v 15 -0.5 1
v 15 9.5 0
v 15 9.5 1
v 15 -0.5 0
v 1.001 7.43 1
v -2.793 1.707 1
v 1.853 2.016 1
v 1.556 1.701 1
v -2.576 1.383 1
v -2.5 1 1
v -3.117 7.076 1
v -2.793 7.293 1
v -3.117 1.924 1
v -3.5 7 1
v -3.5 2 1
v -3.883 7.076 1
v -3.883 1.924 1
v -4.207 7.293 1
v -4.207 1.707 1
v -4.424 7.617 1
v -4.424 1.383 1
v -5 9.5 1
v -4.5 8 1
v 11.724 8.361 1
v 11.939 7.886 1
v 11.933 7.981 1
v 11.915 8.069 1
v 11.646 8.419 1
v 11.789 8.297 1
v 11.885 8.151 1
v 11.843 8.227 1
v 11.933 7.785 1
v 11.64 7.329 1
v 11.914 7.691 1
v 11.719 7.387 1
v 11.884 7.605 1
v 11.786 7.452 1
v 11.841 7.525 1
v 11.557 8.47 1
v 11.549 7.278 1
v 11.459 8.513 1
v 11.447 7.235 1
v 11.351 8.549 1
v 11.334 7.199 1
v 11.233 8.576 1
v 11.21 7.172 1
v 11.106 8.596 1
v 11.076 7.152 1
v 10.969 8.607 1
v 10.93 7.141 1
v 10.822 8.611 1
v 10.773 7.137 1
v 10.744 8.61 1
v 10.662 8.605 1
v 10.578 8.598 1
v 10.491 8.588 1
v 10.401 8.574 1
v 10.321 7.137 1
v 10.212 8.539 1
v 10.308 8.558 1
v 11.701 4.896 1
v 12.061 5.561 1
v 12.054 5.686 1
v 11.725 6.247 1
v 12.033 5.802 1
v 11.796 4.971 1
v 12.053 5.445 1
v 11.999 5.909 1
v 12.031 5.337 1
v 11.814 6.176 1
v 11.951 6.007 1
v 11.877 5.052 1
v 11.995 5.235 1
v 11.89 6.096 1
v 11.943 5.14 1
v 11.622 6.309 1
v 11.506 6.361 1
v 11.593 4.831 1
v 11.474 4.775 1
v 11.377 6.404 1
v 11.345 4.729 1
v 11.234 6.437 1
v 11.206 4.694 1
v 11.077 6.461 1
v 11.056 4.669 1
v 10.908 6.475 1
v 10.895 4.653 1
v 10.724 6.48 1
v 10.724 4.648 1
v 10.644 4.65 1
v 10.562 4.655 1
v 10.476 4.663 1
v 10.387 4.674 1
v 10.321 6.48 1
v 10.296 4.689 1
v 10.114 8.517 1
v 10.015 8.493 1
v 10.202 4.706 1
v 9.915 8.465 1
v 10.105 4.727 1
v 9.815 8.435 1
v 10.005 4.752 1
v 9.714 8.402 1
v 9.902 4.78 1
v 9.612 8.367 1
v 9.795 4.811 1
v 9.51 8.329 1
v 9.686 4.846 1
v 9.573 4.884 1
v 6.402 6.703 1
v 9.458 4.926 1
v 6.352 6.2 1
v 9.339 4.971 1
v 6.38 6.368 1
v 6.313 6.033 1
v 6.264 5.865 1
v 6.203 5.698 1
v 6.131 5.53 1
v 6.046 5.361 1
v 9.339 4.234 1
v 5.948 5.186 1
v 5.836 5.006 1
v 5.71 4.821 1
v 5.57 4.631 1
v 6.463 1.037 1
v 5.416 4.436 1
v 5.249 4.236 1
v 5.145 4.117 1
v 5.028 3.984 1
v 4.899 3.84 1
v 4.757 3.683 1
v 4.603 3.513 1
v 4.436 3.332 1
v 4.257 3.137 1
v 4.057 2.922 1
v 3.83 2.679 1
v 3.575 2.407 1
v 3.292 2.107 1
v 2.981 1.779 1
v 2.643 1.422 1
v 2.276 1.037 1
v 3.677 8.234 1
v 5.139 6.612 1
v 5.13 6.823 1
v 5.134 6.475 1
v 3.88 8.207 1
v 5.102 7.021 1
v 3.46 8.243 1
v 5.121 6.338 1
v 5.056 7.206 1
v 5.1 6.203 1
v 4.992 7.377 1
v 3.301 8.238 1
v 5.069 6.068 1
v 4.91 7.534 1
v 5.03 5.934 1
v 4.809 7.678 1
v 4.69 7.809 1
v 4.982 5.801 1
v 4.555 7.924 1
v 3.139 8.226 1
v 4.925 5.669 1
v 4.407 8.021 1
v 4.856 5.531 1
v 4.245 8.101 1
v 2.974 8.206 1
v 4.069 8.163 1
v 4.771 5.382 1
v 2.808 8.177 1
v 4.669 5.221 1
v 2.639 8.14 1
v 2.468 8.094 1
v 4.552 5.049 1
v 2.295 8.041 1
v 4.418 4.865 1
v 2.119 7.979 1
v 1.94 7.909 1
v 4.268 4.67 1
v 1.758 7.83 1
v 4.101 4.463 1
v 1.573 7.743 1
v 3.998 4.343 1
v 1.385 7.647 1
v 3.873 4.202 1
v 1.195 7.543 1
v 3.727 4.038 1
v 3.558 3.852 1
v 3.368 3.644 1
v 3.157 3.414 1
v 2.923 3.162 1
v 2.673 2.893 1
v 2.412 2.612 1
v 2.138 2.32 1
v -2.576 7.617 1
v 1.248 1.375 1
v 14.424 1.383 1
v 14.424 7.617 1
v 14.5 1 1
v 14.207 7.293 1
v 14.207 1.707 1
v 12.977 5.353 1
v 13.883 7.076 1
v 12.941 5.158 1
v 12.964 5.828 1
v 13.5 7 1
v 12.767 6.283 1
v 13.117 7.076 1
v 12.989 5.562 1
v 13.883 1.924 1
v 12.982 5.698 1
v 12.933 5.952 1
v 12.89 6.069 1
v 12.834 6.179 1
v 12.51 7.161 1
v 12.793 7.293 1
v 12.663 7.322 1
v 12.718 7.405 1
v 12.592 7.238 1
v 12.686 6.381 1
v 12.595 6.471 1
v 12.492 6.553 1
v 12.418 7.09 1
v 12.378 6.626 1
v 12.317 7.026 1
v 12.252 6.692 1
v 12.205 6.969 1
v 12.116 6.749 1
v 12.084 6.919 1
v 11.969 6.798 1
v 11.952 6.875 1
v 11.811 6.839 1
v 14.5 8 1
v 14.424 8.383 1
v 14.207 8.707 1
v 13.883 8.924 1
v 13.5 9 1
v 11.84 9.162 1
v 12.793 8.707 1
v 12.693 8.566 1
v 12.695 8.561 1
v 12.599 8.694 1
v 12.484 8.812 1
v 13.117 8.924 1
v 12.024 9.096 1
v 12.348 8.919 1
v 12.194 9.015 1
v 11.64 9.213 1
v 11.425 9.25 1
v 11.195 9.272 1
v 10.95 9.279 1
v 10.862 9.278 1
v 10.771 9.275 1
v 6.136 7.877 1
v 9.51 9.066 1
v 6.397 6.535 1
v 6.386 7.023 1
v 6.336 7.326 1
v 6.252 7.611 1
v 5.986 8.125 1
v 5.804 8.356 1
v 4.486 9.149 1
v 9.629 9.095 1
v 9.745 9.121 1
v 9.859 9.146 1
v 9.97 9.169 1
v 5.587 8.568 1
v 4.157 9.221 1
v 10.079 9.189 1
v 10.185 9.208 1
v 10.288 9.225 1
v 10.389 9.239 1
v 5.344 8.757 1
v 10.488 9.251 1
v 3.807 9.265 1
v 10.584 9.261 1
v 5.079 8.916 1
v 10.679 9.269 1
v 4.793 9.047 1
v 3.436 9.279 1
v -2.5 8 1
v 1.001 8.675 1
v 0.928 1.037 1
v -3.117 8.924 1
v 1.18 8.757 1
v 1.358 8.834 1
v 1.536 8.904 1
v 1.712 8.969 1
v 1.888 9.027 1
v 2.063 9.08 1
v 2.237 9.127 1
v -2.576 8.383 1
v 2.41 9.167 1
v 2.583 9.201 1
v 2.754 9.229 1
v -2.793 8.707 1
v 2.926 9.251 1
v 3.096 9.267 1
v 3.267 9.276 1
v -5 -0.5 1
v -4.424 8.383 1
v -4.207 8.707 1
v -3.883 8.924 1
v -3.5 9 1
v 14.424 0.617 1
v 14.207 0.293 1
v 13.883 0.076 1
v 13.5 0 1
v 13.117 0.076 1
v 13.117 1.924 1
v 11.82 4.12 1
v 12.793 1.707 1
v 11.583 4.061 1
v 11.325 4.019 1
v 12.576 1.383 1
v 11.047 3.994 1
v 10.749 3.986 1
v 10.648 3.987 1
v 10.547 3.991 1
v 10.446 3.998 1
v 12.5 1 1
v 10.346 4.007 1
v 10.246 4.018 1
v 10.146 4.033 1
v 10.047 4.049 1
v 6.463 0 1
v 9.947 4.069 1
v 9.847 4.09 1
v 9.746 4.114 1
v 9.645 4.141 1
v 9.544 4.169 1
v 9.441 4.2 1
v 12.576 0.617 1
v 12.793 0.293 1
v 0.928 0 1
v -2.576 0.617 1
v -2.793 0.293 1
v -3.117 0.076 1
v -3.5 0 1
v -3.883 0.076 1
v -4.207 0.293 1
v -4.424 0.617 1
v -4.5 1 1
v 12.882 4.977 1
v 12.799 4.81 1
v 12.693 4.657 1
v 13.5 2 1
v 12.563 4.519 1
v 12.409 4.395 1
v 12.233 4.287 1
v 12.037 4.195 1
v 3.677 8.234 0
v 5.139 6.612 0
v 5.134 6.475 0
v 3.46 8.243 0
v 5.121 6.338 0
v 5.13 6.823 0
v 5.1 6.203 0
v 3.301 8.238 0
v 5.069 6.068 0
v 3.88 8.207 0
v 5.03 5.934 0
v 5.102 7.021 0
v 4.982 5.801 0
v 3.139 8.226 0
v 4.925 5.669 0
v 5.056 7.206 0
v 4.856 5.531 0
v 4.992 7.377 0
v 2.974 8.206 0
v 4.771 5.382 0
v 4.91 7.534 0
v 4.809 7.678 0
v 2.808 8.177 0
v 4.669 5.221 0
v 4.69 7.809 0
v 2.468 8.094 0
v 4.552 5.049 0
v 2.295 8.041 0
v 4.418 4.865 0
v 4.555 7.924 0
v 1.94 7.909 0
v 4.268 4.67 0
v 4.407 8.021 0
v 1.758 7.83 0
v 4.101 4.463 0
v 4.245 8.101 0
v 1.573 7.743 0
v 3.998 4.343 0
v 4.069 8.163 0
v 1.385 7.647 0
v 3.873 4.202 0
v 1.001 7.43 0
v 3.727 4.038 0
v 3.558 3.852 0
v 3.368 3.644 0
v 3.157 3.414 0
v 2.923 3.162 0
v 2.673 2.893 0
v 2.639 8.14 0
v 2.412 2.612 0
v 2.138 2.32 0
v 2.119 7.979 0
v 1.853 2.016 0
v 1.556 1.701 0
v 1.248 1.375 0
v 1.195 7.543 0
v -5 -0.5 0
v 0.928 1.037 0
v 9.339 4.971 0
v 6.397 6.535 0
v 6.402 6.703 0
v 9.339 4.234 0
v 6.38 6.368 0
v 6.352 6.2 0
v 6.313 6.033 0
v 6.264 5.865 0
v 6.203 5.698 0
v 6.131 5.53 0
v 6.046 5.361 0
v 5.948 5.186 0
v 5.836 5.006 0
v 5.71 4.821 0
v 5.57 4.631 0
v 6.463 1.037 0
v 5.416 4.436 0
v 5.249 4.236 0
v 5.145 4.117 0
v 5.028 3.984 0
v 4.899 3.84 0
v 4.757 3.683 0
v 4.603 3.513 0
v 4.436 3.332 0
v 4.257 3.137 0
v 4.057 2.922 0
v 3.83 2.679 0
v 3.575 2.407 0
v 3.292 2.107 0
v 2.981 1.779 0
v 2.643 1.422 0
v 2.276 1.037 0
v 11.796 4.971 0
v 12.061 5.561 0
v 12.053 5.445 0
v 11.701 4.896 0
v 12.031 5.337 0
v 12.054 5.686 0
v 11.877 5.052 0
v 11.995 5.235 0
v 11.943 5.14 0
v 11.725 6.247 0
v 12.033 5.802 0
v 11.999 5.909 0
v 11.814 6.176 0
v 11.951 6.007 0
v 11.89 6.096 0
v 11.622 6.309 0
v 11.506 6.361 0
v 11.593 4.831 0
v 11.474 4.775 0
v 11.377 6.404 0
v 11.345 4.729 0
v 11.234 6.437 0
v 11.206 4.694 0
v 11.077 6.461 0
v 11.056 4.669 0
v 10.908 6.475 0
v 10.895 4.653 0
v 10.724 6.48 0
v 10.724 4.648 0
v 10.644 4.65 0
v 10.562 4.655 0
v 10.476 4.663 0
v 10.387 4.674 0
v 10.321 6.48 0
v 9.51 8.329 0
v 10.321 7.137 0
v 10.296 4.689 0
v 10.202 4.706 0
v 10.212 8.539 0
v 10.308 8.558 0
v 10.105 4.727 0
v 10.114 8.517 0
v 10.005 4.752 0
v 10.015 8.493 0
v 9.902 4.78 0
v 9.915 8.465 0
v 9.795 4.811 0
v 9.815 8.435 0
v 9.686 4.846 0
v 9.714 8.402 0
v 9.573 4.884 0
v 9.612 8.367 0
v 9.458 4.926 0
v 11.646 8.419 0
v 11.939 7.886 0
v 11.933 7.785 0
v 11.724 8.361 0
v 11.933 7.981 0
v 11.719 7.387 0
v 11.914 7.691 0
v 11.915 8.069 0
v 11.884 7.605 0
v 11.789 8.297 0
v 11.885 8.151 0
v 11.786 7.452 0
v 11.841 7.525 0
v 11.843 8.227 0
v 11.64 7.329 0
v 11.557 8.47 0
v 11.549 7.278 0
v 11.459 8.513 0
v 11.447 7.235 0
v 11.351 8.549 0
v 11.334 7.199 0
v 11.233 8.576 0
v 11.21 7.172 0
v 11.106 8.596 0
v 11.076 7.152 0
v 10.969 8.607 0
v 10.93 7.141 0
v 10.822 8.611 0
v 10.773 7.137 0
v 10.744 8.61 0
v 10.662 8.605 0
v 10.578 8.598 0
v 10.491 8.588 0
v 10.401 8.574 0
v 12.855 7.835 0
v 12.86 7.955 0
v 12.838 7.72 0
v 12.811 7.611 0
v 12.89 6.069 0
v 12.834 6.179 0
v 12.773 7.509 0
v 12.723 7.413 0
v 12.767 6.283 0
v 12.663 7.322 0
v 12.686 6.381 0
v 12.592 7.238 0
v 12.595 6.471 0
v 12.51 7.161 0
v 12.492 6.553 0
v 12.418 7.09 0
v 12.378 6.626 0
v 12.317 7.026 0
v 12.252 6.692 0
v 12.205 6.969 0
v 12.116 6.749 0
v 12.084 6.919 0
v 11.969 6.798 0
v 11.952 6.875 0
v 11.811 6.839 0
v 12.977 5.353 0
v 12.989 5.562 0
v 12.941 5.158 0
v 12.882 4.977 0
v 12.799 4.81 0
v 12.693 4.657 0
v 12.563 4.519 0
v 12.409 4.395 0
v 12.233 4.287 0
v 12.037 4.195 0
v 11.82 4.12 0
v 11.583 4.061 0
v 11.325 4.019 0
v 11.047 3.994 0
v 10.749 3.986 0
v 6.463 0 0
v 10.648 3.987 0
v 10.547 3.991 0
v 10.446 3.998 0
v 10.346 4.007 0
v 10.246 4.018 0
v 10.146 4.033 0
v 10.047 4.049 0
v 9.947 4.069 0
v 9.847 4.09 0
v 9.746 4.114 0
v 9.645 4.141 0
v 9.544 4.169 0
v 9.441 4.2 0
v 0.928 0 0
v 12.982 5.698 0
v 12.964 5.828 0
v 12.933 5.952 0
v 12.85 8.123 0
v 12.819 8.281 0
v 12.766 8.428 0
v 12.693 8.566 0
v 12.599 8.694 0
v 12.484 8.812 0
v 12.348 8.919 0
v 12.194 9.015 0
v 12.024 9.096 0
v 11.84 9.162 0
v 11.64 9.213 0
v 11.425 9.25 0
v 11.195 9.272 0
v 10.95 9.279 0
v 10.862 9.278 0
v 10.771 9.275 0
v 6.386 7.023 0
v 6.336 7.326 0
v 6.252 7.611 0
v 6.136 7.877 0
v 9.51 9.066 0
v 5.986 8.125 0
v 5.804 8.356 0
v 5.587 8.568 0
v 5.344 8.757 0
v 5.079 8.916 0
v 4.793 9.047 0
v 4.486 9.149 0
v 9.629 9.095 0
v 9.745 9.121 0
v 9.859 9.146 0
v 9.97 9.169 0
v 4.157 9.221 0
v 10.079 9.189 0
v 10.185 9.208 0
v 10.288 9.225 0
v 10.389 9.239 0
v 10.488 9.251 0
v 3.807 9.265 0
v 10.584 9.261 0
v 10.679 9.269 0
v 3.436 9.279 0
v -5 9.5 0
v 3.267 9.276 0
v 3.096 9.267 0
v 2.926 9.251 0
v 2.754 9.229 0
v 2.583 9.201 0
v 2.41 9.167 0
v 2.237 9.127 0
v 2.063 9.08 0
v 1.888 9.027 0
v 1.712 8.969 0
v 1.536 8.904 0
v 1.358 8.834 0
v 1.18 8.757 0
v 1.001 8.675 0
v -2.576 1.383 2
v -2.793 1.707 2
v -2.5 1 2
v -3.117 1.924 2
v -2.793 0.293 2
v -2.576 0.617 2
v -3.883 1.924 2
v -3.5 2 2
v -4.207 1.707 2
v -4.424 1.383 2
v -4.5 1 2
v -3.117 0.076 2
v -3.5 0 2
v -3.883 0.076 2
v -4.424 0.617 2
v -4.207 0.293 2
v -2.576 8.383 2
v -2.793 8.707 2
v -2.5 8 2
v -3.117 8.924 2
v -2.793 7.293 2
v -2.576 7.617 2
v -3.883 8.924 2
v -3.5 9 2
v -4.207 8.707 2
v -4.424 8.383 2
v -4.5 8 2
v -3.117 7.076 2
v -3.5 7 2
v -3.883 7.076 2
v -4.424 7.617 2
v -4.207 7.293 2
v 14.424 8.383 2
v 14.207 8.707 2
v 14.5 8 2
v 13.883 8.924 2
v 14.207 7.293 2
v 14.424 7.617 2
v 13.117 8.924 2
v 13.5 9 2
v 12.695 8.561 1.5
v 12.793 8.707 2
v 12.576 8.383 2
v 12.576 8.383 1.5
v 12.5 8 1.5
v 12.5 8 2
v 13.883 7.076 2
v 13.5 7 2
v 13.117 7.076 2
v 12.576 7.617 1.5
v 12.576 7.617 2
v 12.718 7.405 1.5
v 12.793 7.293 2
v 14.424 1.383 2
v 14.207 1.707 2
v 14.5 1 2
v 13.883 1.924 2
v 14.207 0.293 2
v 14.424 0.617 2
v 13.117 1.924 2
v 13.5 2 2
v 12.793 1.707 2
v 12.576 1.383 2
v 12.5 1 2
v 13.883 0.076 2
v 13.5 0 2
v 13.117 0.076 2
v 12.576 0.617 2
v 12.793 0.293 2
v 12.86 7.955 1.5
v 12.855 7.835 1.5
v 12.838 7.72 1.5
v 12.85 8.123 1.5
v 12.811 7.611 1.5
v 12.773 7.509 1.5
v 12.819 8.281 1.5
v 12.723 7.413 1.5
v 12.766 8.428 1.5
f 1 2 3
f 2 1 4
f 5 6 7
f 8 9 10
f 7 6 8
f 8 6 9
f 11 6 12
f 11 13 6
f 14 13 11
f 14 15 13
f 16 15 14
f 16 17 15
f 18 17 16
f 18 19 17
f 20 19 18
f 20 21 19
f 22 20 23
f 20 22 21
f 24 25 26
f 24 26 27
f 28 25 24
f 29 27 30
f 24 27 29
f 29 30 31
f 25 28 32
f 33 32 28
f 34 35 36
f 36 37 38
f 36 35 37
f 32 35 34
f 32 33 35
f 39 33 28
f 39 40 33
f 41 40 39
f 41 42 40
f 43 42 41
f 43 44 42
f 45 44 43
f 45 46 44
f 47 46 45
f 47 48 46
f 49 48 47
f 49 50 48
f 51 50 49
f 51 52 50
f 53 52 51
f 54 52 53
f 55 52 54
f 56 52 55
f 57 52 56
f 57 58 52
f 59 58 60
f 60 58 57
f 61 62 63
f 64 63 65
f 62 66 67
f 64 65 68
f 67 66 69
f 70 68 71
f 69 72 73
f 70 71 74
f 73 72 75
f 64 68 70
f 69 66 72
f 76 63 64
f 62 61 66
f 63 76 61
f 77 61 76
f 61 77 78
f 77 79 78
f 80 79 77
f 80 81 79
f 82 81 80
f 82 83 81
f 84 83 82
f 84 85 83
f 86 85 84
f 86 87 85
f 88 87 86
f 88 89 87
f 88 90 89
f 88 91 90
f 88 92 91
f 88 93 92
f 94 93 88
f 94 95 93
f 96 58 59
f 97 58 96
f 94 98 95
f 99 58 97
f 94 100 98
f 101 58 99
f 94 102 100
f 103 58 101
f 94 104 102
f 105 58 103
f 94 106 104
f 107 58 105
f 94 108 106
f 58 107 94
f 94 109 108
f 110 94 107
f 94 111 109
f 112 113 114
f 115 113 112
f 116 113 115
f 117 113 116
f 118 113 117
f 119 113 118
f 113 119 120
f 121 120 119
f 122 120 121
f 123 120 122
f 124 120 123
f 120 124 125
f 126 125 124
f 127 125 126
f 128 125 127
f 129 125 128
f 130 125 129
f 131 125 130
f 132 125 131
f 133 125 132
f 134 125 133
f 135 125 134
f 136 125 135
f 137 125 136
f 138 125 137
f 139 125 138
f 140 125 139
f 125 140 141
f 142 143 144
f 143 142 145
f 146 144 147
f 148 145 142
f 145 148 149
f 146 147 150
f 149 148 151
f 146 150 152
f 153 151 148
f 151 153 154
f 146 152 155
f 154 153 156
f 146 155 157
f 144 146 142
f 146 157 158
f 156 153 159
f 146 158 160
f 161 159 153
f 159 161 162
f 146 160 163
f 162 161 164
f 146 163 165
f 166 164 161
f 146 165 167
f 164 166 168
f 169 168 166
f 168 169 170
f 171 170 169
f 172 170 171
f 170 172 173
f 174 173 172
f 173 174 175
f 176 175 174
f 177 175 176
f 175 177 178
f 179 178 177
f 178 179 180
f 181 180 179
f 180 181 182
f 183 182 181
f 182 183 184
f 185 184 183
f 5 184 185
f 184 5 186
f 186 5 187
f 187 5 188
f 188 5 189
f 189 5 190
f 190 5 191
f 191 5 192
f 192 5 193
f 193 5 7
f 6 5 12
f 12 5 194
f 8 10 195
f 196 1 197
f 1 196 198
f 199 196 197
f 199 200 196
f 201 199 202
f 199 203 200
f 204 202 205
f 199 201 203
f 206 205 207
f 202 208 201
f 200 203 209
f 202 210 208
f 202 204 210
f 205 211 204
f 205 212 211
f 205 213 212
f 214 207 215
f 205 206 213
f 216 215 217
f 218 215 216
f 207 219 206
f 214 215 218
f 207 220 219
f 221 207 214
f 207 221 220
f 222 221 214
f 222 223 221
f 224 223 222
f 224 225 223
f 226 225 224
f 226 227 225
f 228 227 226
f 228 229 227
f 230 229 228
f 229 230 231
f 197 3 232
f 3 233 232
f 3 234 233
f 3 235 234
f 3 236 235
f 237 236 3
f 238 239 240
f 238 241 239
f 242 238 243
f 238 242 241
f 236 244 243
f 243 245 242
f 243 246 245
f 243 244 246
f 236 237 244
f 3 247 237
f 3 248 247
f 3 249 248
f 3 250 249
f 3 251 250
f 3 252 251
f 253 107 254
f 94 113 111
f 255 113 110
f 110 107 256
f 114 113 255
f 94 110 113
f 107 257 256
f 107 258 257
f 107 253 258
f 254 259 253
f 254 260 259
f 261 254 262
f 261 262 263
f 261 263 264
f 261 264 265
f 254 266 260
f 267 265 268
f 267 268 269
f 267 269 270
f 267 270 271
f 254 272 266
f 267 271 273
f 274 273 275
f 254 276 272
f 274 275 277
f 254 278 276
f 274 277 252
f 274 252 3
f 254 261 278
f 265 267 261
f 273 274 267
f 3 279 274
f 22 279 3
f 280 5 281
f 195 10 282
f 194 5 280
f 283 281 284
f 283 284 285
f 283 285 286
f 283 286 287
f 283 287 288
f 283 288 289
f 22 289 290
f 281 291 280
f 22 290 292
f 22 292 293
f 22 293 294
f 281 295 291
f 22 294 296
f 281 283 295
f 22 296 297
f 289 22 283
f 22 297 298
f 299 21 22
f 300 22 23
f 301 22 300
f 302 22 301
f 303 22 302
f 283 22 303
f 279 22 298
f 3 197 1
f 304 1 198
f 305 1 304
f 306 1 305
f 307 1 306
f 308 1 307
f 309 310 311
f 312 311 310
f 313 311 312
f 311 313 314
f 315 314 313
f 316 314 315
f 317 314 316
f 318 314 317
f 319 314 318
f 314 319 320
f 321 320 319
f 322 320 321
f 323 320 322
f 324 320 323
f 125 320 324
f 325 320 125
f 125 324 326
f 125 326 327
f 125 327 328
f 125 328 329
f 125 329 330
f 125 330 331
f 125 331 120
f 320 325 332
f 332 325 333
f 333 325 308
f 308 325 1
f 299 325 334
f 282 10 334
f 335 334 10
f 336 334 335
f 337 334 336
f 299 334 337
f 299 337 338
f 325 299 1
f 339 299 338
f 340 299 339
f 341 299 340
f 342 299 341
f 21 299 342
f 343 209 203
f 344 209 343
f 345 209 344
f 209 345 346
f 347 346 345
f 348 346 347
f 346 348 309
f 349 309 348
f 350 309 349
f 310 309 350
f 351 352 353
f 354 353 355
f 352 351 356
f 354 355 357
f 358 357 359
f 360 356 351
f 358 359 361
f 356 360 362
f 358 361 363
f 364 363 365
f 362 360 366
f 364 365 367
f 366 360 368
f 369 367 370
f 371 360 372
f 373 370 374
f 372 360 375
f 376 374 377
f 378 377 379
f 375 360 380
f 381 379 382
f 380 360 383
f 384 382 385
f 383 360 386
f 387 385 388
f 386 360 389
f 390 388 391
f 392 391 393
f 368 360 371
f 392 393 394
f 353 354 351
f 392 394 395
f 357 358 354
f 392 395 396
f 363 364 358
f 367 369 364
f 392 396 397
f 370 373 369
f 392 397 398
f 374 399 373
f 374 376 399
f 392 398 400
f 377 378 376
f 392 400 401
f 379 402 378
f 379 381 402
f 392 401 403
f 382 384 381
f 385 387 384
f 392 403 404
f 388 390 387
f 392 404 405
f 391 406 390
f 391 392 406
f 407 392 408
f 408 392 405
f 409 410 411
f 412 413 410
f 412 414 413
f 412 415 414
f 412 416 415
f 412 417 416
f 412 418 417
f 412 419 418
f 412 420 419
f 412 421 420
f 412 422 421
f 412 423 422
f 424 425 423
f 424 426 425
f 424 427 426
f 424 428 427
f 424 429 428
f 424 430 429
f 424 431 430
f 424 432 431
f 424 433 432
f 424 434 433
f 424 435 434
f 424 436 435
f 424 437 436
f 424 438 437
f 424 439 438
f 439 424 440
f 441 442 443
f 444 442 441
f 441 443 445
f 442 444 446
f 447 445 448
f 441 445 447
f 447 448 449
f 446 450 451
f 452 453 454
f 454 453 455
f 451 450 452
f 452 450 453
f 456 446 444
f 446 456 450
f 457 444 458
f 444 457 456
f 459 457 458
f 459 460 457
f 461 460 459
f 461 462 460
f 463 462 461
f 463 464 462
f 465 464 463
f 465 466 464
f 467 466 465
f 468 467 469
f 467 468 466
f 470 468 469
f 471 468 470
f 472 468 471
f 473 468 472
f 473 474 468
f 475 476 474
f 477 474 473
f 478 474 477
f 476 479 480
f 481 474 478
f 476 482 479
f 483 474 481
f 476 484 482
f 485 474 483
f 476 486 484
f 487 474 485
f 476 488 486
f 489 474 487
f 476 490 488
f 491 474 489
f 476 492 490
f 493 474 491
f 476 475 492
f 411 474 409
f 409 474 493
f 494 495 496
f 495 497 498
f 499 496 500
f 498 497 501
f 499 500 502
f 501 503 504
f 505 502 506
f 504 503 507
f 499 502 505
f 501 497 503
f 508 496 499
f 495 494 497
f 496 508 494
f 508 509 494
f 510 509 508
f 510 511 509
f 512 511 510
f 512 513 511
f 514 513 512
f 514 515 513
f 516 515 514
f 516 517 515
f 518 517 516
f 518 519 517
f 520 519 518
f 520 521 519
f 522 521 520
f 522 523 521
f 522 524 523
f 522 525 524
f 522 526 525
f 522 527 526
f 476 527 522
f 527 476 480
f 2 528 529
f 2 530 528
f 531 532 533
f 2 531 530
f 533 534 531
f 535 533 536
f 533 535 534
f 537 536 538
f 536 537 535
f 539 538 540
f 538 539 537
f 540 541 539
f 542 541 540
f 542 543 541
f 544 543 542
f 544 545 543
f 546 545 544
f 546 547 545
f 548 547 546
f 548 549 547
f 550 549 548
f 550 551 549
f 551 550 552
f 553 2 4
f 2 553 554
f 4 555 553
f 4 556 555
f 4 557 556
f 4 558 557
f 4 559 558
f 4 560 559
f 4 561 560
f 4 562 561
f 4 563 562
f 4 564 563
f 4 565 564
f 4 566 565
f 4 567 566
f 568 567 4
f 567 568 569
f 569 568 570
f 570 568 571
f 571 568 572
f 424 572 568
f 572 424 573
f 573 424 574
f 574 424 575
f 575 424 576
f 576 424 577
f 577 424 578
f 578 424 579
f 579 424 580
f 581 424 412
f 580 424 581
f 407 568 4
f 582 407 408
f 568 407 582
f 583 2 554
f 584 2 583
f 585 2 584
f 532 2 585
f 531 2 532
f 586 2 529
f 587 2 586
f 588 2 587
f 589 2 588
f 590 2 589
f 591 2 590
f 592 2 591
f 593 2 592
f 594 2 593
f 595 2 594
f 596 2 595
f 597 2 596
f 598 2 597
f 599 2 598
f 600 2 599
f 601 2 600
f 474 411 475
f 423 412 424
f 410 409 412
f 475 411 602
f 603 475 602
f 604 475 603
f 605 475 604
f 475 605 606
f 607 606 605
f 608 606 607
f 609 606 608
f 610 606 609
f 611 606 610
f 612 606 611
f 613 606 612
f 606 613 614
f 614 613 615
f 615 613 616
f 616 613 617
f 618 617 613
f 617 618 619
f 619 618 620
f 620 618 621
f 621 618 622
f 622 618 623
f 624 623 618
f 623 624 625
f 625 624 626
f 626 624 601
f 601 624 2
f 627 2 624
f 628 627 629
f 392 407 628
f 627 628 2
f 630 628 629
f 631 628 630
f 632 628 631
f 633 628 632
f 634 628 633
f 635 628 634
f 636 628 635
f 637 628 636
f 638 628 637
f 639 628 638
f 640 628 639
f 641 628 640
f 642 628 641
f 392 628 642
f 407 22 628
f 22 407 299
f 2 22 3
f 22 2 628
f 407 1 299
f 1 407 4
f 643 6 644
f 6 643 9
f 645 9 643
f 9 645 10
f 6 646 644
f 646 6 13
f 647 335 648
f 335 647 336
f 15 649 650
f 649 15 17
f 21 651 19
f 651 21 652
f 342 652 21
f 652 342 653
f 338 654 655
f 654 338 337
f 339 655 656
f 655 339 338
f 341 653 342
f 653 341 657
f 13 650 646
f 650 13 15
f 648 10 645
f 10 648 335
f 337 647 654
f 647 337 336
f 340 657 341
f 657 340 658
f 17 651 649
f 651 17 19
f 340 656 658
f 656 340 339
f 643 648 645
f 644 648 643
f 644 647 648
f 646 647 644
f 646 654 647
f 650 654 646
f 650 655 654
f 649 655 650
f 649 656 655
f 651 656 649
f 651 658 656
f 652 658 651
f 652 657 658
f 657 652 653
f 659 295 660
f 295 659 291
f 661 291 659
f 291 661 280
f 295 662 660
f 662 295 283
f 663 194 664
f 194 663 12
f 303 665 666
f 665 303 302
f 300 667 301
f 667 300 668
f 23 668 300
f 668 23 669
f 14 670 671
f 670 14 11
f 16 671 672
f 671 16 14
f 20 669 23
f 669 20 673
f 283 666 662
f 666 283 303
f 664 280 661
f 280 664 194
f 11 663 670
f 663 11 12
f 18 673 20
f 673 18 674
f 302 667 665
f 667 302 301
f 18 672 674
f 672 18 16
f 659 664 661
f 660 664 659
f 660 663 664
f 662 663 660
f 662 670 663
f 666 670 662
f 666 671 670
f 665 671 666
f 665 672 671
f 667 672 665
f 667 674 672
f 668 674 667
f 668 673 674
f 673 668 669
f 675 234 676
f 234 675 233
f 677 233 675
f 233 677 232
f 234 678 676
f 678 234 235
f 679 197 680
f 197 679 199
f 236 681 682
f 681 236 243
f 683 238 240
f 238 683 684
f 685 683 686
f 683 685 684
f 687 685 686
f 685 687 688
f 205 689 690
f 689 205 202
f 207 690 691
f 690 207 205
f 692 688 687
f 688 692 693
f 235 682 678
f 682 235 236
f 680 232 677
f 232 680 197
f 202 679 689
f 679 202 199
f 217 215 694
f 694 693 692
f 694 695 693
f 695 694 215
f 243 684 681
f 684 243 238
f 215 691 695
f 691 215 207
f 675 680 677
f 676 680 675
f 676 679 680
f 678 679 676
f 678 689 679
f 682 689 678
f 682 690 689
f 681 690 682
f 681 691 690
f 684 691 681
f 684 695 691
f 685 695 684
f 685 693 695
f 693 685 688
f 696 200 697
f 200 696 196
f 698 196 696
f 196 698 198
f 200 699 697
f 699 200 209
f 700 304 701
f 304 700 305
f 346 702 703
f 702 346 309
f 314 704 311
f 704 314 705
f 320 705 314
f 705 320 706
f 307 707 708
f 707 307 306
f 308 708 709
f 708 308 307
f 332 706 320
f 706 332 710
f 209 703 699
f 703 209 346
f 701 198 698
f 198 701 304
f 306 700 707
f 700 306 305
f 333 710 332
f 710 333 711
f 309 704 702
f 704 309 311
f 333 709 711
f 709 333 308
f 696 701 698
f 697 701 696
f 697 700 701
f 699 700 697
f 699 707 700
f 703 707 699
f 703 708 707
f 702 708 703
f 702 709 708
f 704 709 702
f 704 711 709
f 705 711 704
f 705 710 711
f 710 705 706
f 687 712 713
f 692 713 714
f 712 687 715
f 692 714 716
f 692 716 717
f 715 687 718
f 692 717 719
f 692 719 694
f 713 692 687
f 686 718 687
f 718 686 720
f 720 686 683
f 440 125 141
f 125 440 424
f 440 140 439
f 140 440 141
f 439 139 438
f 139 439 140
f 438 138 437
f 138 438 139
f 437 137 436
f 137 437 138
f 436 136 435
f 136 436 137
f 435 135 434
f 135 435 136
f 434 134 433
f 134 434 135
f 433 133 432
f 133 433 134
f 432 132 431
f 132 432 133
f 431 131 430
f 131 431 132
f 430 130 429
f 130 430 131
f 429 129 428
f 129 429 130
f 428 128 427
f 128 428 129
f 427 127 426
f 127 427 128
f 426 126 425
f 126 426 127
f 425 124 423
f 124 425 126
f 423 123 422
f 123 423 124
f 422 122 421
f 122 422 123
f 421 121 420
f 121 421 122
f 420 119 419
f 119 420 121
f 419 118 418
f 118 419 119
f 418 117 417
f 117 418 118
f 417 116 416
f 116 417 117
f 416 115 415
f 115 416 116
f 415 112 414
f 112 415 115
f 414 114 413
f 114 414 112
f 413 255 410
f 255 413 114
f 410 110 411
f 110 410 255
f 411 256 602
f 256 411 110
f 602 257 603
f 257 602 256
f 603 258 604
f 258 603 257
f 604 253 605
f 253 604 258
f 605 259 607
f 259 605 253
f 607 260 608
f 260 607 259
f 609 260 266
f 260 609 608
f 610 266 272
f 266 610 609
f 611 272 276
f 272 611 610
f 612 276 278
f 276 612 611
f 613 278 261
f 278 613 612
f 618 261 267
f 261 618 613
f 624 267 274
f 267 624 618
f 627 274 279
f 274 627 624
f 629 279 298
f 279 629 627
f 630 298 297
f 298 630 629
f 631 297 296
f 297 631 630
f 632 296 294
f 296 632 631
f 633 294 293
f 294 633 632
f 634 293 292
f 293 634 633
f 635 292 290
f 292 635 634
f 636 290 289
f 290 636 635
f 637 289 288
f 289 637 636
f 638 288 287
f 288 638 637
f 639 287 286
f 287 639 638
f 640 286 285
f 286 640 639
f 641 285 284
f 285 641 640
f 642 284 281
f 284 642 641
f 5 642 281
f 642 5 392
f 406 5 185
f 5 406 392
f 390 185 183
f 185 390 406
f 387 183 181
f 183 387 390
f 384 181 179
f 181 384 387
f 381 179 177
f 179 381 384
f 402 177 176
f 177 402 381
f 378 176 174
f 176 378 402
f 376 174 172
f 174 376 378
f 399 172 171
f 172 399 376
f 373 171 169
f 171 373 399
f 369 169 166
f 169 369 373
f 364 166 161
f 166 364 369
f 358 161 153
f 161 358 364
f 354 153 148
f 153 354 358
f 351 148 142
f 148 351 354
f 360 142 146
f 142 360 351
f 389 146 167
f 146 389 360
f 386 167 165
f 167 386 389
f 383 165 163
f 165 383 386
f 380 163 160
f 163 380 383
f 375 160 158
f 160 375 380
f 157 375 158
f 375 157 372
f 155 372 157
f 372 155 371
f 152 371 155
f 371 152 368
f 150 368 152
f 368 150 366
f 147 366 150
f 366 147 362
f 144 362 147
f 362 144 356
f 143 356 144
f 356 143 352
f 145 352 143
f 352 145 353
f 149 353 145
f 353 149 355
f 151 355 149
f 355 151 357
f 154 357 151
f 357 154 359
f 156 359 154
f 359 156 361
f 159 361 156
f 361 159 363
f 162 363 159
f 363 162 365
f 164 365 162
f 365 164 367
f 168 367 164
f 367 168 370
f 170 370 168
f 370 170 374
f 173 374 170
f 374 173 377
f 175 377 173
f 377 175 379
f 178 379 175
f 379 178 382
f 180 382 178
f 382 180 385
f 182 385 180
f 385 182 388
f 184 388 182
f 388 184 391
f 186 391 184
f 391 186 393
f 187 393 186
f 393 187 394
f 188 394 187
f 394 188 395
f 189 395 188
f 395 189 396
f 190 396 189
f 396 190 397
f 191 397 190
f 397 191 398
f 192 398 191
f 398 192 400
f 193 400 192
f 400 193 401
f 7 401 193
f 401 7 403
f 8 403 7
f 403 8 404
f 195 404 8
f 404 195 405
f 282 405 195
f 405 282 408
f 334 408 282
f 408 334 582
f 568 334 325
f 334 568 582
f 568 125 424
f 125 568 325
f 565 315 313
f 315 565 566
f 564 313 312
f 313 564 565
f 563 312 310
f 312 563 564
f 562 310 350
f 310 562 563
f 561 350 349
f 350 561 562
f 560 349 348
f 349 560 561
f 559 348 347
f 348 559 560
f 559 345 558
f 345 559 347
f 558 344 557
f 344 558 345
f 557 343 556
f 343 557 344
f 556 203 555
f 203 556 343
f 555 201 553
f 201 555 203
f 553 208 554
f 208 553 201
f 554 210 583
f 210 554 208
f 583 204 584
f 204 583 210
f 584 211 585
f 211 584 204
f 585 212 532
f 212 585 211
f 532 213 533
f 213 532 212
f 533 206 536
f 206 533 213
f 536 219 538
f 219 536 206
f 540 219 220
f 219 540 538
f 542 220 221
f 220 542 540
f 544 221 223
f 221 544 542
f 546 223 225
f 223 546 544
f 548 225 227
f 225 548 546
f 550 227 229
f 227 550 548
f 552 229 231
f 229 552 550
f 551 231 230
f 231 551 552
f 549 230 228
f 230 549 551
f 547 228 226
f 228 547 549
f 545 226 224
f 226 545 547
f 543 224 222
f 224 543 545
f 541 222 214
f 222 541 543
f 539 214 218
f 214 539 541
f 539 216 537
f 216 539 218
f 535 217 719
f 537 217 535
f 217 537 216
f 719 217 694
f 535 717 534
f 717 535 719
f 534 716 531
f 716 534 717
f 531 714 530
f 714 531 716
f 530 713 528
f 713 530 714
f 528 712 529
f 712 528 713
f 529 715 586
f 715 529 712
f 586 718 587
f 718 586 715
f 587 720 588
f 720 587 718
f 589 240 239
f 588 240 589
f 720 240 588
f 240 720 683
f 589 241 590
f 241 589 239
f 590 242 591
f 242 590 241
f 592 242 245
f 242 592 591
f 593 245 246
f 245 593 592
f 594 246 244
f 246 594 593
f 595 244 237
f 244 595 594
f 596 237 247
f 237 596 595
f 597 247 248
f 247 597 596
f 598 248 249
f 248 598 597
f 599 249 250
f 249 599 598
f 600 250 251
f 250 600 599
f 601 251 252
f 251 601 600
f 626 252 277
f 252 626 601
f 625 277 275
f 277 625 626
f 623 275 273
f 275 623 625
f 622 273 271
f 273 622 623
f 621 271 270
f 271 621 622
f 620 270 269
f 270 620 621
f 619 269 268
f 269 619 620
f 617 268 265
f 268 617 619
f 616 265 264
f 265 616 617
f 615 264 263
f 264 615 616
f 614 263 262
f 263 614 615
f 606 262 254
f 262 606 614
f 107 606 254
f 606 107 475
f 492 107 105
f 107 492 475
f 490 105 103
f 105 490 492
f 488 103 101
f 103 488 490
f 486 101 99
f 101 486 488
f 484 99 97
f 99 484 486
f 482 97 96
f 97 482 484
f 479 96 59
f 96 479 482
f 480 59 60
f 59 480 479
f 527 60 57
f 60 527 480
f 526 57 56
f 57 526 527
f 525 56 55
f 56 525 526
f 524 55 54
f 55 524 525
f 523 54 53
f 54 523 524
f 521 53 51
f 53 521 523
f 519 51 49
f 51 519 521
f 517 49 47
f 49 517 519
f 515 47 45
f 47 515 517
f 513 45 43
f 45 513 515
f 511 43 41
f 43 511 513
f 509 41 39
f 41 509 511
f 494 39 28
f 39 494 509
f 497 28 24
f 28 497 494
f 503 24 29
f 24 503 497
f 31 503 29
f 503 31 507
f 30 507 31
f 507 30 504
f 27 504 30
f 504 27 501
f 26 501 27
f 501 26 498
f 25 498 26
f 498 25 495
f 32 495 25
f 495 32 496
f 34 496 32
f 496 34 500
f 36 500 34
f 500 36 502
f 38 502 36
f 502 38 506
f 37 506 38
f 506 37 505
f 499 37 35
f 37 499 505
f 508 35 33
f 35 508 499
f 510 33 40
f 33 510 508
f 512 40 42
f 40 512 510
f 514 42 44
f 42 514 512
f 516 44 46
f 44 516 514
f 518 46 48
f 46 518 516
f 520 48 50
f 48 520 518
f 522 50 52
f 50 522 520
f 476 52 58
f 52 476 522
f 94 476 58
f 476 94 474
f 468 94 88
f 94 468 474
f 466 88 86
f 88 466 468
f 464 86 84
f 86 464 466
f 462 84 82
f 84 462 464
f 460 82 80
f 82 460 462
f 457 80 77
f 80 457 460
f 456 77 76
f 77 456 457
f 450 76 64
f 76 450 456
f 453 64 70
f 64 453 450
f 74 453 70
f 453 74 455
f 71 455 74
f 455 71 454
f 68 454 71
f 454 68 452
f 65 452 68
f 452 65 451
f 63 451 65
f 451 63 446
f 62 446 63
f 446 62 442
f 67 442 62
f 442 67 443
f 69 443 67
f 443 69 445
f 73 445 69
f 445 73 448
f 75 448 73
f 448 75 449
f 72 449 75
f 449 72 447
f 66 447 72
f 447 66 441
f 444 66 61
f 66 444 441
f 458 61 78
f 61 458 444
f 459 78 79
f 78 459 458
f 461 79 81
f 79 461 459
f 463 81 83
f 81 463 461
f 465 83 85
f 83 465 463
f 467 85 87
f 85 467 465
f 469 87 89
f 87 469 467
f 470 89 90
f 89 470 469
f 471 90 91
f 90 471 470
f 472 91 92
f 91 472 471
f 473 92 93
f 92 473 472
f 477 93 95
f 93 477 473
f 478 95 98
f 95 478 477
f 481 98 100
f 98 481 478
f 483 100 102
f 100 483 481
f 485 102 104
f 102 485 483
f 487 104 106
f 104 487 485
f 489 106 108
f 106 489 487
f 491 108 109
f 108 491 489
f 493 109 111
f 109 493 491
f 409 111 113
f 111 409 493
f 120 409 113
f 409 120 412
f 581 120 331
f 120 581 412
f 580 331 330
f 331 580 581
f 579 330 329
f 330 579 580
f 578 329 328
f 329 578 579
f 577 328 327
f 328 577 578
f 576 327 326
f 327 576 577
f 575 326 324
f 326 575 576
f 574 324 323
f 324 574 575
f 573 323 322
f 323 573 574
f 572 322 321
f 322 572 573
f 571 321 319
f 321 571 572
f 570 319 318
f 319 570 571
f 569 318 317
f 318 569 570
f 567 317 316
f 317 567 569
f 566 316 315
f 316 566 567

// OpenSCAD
str="Text";
font = "Consolas";
width=40.6;

letter_size = 9;
letter_height = 2;




difference(){
translate([-5,-0.5,0]){
    cube([20,10,1]);

    translate([1.5,1.5,0])cylinder(r=1,h=2,$fn=16);
    translate([1.5,8.5,0])cylinder(r=1,h=2,$fn=16);
    translate([20-1.5,8.5,0])cylinder(r=1,h=2,$fn=16);
    translate([20-1.5,1.5,0])cylinder(r=1,h=2,$fn=16);
}
translate([0,0,-0.5])
linear_extrude(height = letter_height, convexity = 10) {
text("2³", size = letter_size, font = font,, $fn = 48, spacing=1);
}
}
